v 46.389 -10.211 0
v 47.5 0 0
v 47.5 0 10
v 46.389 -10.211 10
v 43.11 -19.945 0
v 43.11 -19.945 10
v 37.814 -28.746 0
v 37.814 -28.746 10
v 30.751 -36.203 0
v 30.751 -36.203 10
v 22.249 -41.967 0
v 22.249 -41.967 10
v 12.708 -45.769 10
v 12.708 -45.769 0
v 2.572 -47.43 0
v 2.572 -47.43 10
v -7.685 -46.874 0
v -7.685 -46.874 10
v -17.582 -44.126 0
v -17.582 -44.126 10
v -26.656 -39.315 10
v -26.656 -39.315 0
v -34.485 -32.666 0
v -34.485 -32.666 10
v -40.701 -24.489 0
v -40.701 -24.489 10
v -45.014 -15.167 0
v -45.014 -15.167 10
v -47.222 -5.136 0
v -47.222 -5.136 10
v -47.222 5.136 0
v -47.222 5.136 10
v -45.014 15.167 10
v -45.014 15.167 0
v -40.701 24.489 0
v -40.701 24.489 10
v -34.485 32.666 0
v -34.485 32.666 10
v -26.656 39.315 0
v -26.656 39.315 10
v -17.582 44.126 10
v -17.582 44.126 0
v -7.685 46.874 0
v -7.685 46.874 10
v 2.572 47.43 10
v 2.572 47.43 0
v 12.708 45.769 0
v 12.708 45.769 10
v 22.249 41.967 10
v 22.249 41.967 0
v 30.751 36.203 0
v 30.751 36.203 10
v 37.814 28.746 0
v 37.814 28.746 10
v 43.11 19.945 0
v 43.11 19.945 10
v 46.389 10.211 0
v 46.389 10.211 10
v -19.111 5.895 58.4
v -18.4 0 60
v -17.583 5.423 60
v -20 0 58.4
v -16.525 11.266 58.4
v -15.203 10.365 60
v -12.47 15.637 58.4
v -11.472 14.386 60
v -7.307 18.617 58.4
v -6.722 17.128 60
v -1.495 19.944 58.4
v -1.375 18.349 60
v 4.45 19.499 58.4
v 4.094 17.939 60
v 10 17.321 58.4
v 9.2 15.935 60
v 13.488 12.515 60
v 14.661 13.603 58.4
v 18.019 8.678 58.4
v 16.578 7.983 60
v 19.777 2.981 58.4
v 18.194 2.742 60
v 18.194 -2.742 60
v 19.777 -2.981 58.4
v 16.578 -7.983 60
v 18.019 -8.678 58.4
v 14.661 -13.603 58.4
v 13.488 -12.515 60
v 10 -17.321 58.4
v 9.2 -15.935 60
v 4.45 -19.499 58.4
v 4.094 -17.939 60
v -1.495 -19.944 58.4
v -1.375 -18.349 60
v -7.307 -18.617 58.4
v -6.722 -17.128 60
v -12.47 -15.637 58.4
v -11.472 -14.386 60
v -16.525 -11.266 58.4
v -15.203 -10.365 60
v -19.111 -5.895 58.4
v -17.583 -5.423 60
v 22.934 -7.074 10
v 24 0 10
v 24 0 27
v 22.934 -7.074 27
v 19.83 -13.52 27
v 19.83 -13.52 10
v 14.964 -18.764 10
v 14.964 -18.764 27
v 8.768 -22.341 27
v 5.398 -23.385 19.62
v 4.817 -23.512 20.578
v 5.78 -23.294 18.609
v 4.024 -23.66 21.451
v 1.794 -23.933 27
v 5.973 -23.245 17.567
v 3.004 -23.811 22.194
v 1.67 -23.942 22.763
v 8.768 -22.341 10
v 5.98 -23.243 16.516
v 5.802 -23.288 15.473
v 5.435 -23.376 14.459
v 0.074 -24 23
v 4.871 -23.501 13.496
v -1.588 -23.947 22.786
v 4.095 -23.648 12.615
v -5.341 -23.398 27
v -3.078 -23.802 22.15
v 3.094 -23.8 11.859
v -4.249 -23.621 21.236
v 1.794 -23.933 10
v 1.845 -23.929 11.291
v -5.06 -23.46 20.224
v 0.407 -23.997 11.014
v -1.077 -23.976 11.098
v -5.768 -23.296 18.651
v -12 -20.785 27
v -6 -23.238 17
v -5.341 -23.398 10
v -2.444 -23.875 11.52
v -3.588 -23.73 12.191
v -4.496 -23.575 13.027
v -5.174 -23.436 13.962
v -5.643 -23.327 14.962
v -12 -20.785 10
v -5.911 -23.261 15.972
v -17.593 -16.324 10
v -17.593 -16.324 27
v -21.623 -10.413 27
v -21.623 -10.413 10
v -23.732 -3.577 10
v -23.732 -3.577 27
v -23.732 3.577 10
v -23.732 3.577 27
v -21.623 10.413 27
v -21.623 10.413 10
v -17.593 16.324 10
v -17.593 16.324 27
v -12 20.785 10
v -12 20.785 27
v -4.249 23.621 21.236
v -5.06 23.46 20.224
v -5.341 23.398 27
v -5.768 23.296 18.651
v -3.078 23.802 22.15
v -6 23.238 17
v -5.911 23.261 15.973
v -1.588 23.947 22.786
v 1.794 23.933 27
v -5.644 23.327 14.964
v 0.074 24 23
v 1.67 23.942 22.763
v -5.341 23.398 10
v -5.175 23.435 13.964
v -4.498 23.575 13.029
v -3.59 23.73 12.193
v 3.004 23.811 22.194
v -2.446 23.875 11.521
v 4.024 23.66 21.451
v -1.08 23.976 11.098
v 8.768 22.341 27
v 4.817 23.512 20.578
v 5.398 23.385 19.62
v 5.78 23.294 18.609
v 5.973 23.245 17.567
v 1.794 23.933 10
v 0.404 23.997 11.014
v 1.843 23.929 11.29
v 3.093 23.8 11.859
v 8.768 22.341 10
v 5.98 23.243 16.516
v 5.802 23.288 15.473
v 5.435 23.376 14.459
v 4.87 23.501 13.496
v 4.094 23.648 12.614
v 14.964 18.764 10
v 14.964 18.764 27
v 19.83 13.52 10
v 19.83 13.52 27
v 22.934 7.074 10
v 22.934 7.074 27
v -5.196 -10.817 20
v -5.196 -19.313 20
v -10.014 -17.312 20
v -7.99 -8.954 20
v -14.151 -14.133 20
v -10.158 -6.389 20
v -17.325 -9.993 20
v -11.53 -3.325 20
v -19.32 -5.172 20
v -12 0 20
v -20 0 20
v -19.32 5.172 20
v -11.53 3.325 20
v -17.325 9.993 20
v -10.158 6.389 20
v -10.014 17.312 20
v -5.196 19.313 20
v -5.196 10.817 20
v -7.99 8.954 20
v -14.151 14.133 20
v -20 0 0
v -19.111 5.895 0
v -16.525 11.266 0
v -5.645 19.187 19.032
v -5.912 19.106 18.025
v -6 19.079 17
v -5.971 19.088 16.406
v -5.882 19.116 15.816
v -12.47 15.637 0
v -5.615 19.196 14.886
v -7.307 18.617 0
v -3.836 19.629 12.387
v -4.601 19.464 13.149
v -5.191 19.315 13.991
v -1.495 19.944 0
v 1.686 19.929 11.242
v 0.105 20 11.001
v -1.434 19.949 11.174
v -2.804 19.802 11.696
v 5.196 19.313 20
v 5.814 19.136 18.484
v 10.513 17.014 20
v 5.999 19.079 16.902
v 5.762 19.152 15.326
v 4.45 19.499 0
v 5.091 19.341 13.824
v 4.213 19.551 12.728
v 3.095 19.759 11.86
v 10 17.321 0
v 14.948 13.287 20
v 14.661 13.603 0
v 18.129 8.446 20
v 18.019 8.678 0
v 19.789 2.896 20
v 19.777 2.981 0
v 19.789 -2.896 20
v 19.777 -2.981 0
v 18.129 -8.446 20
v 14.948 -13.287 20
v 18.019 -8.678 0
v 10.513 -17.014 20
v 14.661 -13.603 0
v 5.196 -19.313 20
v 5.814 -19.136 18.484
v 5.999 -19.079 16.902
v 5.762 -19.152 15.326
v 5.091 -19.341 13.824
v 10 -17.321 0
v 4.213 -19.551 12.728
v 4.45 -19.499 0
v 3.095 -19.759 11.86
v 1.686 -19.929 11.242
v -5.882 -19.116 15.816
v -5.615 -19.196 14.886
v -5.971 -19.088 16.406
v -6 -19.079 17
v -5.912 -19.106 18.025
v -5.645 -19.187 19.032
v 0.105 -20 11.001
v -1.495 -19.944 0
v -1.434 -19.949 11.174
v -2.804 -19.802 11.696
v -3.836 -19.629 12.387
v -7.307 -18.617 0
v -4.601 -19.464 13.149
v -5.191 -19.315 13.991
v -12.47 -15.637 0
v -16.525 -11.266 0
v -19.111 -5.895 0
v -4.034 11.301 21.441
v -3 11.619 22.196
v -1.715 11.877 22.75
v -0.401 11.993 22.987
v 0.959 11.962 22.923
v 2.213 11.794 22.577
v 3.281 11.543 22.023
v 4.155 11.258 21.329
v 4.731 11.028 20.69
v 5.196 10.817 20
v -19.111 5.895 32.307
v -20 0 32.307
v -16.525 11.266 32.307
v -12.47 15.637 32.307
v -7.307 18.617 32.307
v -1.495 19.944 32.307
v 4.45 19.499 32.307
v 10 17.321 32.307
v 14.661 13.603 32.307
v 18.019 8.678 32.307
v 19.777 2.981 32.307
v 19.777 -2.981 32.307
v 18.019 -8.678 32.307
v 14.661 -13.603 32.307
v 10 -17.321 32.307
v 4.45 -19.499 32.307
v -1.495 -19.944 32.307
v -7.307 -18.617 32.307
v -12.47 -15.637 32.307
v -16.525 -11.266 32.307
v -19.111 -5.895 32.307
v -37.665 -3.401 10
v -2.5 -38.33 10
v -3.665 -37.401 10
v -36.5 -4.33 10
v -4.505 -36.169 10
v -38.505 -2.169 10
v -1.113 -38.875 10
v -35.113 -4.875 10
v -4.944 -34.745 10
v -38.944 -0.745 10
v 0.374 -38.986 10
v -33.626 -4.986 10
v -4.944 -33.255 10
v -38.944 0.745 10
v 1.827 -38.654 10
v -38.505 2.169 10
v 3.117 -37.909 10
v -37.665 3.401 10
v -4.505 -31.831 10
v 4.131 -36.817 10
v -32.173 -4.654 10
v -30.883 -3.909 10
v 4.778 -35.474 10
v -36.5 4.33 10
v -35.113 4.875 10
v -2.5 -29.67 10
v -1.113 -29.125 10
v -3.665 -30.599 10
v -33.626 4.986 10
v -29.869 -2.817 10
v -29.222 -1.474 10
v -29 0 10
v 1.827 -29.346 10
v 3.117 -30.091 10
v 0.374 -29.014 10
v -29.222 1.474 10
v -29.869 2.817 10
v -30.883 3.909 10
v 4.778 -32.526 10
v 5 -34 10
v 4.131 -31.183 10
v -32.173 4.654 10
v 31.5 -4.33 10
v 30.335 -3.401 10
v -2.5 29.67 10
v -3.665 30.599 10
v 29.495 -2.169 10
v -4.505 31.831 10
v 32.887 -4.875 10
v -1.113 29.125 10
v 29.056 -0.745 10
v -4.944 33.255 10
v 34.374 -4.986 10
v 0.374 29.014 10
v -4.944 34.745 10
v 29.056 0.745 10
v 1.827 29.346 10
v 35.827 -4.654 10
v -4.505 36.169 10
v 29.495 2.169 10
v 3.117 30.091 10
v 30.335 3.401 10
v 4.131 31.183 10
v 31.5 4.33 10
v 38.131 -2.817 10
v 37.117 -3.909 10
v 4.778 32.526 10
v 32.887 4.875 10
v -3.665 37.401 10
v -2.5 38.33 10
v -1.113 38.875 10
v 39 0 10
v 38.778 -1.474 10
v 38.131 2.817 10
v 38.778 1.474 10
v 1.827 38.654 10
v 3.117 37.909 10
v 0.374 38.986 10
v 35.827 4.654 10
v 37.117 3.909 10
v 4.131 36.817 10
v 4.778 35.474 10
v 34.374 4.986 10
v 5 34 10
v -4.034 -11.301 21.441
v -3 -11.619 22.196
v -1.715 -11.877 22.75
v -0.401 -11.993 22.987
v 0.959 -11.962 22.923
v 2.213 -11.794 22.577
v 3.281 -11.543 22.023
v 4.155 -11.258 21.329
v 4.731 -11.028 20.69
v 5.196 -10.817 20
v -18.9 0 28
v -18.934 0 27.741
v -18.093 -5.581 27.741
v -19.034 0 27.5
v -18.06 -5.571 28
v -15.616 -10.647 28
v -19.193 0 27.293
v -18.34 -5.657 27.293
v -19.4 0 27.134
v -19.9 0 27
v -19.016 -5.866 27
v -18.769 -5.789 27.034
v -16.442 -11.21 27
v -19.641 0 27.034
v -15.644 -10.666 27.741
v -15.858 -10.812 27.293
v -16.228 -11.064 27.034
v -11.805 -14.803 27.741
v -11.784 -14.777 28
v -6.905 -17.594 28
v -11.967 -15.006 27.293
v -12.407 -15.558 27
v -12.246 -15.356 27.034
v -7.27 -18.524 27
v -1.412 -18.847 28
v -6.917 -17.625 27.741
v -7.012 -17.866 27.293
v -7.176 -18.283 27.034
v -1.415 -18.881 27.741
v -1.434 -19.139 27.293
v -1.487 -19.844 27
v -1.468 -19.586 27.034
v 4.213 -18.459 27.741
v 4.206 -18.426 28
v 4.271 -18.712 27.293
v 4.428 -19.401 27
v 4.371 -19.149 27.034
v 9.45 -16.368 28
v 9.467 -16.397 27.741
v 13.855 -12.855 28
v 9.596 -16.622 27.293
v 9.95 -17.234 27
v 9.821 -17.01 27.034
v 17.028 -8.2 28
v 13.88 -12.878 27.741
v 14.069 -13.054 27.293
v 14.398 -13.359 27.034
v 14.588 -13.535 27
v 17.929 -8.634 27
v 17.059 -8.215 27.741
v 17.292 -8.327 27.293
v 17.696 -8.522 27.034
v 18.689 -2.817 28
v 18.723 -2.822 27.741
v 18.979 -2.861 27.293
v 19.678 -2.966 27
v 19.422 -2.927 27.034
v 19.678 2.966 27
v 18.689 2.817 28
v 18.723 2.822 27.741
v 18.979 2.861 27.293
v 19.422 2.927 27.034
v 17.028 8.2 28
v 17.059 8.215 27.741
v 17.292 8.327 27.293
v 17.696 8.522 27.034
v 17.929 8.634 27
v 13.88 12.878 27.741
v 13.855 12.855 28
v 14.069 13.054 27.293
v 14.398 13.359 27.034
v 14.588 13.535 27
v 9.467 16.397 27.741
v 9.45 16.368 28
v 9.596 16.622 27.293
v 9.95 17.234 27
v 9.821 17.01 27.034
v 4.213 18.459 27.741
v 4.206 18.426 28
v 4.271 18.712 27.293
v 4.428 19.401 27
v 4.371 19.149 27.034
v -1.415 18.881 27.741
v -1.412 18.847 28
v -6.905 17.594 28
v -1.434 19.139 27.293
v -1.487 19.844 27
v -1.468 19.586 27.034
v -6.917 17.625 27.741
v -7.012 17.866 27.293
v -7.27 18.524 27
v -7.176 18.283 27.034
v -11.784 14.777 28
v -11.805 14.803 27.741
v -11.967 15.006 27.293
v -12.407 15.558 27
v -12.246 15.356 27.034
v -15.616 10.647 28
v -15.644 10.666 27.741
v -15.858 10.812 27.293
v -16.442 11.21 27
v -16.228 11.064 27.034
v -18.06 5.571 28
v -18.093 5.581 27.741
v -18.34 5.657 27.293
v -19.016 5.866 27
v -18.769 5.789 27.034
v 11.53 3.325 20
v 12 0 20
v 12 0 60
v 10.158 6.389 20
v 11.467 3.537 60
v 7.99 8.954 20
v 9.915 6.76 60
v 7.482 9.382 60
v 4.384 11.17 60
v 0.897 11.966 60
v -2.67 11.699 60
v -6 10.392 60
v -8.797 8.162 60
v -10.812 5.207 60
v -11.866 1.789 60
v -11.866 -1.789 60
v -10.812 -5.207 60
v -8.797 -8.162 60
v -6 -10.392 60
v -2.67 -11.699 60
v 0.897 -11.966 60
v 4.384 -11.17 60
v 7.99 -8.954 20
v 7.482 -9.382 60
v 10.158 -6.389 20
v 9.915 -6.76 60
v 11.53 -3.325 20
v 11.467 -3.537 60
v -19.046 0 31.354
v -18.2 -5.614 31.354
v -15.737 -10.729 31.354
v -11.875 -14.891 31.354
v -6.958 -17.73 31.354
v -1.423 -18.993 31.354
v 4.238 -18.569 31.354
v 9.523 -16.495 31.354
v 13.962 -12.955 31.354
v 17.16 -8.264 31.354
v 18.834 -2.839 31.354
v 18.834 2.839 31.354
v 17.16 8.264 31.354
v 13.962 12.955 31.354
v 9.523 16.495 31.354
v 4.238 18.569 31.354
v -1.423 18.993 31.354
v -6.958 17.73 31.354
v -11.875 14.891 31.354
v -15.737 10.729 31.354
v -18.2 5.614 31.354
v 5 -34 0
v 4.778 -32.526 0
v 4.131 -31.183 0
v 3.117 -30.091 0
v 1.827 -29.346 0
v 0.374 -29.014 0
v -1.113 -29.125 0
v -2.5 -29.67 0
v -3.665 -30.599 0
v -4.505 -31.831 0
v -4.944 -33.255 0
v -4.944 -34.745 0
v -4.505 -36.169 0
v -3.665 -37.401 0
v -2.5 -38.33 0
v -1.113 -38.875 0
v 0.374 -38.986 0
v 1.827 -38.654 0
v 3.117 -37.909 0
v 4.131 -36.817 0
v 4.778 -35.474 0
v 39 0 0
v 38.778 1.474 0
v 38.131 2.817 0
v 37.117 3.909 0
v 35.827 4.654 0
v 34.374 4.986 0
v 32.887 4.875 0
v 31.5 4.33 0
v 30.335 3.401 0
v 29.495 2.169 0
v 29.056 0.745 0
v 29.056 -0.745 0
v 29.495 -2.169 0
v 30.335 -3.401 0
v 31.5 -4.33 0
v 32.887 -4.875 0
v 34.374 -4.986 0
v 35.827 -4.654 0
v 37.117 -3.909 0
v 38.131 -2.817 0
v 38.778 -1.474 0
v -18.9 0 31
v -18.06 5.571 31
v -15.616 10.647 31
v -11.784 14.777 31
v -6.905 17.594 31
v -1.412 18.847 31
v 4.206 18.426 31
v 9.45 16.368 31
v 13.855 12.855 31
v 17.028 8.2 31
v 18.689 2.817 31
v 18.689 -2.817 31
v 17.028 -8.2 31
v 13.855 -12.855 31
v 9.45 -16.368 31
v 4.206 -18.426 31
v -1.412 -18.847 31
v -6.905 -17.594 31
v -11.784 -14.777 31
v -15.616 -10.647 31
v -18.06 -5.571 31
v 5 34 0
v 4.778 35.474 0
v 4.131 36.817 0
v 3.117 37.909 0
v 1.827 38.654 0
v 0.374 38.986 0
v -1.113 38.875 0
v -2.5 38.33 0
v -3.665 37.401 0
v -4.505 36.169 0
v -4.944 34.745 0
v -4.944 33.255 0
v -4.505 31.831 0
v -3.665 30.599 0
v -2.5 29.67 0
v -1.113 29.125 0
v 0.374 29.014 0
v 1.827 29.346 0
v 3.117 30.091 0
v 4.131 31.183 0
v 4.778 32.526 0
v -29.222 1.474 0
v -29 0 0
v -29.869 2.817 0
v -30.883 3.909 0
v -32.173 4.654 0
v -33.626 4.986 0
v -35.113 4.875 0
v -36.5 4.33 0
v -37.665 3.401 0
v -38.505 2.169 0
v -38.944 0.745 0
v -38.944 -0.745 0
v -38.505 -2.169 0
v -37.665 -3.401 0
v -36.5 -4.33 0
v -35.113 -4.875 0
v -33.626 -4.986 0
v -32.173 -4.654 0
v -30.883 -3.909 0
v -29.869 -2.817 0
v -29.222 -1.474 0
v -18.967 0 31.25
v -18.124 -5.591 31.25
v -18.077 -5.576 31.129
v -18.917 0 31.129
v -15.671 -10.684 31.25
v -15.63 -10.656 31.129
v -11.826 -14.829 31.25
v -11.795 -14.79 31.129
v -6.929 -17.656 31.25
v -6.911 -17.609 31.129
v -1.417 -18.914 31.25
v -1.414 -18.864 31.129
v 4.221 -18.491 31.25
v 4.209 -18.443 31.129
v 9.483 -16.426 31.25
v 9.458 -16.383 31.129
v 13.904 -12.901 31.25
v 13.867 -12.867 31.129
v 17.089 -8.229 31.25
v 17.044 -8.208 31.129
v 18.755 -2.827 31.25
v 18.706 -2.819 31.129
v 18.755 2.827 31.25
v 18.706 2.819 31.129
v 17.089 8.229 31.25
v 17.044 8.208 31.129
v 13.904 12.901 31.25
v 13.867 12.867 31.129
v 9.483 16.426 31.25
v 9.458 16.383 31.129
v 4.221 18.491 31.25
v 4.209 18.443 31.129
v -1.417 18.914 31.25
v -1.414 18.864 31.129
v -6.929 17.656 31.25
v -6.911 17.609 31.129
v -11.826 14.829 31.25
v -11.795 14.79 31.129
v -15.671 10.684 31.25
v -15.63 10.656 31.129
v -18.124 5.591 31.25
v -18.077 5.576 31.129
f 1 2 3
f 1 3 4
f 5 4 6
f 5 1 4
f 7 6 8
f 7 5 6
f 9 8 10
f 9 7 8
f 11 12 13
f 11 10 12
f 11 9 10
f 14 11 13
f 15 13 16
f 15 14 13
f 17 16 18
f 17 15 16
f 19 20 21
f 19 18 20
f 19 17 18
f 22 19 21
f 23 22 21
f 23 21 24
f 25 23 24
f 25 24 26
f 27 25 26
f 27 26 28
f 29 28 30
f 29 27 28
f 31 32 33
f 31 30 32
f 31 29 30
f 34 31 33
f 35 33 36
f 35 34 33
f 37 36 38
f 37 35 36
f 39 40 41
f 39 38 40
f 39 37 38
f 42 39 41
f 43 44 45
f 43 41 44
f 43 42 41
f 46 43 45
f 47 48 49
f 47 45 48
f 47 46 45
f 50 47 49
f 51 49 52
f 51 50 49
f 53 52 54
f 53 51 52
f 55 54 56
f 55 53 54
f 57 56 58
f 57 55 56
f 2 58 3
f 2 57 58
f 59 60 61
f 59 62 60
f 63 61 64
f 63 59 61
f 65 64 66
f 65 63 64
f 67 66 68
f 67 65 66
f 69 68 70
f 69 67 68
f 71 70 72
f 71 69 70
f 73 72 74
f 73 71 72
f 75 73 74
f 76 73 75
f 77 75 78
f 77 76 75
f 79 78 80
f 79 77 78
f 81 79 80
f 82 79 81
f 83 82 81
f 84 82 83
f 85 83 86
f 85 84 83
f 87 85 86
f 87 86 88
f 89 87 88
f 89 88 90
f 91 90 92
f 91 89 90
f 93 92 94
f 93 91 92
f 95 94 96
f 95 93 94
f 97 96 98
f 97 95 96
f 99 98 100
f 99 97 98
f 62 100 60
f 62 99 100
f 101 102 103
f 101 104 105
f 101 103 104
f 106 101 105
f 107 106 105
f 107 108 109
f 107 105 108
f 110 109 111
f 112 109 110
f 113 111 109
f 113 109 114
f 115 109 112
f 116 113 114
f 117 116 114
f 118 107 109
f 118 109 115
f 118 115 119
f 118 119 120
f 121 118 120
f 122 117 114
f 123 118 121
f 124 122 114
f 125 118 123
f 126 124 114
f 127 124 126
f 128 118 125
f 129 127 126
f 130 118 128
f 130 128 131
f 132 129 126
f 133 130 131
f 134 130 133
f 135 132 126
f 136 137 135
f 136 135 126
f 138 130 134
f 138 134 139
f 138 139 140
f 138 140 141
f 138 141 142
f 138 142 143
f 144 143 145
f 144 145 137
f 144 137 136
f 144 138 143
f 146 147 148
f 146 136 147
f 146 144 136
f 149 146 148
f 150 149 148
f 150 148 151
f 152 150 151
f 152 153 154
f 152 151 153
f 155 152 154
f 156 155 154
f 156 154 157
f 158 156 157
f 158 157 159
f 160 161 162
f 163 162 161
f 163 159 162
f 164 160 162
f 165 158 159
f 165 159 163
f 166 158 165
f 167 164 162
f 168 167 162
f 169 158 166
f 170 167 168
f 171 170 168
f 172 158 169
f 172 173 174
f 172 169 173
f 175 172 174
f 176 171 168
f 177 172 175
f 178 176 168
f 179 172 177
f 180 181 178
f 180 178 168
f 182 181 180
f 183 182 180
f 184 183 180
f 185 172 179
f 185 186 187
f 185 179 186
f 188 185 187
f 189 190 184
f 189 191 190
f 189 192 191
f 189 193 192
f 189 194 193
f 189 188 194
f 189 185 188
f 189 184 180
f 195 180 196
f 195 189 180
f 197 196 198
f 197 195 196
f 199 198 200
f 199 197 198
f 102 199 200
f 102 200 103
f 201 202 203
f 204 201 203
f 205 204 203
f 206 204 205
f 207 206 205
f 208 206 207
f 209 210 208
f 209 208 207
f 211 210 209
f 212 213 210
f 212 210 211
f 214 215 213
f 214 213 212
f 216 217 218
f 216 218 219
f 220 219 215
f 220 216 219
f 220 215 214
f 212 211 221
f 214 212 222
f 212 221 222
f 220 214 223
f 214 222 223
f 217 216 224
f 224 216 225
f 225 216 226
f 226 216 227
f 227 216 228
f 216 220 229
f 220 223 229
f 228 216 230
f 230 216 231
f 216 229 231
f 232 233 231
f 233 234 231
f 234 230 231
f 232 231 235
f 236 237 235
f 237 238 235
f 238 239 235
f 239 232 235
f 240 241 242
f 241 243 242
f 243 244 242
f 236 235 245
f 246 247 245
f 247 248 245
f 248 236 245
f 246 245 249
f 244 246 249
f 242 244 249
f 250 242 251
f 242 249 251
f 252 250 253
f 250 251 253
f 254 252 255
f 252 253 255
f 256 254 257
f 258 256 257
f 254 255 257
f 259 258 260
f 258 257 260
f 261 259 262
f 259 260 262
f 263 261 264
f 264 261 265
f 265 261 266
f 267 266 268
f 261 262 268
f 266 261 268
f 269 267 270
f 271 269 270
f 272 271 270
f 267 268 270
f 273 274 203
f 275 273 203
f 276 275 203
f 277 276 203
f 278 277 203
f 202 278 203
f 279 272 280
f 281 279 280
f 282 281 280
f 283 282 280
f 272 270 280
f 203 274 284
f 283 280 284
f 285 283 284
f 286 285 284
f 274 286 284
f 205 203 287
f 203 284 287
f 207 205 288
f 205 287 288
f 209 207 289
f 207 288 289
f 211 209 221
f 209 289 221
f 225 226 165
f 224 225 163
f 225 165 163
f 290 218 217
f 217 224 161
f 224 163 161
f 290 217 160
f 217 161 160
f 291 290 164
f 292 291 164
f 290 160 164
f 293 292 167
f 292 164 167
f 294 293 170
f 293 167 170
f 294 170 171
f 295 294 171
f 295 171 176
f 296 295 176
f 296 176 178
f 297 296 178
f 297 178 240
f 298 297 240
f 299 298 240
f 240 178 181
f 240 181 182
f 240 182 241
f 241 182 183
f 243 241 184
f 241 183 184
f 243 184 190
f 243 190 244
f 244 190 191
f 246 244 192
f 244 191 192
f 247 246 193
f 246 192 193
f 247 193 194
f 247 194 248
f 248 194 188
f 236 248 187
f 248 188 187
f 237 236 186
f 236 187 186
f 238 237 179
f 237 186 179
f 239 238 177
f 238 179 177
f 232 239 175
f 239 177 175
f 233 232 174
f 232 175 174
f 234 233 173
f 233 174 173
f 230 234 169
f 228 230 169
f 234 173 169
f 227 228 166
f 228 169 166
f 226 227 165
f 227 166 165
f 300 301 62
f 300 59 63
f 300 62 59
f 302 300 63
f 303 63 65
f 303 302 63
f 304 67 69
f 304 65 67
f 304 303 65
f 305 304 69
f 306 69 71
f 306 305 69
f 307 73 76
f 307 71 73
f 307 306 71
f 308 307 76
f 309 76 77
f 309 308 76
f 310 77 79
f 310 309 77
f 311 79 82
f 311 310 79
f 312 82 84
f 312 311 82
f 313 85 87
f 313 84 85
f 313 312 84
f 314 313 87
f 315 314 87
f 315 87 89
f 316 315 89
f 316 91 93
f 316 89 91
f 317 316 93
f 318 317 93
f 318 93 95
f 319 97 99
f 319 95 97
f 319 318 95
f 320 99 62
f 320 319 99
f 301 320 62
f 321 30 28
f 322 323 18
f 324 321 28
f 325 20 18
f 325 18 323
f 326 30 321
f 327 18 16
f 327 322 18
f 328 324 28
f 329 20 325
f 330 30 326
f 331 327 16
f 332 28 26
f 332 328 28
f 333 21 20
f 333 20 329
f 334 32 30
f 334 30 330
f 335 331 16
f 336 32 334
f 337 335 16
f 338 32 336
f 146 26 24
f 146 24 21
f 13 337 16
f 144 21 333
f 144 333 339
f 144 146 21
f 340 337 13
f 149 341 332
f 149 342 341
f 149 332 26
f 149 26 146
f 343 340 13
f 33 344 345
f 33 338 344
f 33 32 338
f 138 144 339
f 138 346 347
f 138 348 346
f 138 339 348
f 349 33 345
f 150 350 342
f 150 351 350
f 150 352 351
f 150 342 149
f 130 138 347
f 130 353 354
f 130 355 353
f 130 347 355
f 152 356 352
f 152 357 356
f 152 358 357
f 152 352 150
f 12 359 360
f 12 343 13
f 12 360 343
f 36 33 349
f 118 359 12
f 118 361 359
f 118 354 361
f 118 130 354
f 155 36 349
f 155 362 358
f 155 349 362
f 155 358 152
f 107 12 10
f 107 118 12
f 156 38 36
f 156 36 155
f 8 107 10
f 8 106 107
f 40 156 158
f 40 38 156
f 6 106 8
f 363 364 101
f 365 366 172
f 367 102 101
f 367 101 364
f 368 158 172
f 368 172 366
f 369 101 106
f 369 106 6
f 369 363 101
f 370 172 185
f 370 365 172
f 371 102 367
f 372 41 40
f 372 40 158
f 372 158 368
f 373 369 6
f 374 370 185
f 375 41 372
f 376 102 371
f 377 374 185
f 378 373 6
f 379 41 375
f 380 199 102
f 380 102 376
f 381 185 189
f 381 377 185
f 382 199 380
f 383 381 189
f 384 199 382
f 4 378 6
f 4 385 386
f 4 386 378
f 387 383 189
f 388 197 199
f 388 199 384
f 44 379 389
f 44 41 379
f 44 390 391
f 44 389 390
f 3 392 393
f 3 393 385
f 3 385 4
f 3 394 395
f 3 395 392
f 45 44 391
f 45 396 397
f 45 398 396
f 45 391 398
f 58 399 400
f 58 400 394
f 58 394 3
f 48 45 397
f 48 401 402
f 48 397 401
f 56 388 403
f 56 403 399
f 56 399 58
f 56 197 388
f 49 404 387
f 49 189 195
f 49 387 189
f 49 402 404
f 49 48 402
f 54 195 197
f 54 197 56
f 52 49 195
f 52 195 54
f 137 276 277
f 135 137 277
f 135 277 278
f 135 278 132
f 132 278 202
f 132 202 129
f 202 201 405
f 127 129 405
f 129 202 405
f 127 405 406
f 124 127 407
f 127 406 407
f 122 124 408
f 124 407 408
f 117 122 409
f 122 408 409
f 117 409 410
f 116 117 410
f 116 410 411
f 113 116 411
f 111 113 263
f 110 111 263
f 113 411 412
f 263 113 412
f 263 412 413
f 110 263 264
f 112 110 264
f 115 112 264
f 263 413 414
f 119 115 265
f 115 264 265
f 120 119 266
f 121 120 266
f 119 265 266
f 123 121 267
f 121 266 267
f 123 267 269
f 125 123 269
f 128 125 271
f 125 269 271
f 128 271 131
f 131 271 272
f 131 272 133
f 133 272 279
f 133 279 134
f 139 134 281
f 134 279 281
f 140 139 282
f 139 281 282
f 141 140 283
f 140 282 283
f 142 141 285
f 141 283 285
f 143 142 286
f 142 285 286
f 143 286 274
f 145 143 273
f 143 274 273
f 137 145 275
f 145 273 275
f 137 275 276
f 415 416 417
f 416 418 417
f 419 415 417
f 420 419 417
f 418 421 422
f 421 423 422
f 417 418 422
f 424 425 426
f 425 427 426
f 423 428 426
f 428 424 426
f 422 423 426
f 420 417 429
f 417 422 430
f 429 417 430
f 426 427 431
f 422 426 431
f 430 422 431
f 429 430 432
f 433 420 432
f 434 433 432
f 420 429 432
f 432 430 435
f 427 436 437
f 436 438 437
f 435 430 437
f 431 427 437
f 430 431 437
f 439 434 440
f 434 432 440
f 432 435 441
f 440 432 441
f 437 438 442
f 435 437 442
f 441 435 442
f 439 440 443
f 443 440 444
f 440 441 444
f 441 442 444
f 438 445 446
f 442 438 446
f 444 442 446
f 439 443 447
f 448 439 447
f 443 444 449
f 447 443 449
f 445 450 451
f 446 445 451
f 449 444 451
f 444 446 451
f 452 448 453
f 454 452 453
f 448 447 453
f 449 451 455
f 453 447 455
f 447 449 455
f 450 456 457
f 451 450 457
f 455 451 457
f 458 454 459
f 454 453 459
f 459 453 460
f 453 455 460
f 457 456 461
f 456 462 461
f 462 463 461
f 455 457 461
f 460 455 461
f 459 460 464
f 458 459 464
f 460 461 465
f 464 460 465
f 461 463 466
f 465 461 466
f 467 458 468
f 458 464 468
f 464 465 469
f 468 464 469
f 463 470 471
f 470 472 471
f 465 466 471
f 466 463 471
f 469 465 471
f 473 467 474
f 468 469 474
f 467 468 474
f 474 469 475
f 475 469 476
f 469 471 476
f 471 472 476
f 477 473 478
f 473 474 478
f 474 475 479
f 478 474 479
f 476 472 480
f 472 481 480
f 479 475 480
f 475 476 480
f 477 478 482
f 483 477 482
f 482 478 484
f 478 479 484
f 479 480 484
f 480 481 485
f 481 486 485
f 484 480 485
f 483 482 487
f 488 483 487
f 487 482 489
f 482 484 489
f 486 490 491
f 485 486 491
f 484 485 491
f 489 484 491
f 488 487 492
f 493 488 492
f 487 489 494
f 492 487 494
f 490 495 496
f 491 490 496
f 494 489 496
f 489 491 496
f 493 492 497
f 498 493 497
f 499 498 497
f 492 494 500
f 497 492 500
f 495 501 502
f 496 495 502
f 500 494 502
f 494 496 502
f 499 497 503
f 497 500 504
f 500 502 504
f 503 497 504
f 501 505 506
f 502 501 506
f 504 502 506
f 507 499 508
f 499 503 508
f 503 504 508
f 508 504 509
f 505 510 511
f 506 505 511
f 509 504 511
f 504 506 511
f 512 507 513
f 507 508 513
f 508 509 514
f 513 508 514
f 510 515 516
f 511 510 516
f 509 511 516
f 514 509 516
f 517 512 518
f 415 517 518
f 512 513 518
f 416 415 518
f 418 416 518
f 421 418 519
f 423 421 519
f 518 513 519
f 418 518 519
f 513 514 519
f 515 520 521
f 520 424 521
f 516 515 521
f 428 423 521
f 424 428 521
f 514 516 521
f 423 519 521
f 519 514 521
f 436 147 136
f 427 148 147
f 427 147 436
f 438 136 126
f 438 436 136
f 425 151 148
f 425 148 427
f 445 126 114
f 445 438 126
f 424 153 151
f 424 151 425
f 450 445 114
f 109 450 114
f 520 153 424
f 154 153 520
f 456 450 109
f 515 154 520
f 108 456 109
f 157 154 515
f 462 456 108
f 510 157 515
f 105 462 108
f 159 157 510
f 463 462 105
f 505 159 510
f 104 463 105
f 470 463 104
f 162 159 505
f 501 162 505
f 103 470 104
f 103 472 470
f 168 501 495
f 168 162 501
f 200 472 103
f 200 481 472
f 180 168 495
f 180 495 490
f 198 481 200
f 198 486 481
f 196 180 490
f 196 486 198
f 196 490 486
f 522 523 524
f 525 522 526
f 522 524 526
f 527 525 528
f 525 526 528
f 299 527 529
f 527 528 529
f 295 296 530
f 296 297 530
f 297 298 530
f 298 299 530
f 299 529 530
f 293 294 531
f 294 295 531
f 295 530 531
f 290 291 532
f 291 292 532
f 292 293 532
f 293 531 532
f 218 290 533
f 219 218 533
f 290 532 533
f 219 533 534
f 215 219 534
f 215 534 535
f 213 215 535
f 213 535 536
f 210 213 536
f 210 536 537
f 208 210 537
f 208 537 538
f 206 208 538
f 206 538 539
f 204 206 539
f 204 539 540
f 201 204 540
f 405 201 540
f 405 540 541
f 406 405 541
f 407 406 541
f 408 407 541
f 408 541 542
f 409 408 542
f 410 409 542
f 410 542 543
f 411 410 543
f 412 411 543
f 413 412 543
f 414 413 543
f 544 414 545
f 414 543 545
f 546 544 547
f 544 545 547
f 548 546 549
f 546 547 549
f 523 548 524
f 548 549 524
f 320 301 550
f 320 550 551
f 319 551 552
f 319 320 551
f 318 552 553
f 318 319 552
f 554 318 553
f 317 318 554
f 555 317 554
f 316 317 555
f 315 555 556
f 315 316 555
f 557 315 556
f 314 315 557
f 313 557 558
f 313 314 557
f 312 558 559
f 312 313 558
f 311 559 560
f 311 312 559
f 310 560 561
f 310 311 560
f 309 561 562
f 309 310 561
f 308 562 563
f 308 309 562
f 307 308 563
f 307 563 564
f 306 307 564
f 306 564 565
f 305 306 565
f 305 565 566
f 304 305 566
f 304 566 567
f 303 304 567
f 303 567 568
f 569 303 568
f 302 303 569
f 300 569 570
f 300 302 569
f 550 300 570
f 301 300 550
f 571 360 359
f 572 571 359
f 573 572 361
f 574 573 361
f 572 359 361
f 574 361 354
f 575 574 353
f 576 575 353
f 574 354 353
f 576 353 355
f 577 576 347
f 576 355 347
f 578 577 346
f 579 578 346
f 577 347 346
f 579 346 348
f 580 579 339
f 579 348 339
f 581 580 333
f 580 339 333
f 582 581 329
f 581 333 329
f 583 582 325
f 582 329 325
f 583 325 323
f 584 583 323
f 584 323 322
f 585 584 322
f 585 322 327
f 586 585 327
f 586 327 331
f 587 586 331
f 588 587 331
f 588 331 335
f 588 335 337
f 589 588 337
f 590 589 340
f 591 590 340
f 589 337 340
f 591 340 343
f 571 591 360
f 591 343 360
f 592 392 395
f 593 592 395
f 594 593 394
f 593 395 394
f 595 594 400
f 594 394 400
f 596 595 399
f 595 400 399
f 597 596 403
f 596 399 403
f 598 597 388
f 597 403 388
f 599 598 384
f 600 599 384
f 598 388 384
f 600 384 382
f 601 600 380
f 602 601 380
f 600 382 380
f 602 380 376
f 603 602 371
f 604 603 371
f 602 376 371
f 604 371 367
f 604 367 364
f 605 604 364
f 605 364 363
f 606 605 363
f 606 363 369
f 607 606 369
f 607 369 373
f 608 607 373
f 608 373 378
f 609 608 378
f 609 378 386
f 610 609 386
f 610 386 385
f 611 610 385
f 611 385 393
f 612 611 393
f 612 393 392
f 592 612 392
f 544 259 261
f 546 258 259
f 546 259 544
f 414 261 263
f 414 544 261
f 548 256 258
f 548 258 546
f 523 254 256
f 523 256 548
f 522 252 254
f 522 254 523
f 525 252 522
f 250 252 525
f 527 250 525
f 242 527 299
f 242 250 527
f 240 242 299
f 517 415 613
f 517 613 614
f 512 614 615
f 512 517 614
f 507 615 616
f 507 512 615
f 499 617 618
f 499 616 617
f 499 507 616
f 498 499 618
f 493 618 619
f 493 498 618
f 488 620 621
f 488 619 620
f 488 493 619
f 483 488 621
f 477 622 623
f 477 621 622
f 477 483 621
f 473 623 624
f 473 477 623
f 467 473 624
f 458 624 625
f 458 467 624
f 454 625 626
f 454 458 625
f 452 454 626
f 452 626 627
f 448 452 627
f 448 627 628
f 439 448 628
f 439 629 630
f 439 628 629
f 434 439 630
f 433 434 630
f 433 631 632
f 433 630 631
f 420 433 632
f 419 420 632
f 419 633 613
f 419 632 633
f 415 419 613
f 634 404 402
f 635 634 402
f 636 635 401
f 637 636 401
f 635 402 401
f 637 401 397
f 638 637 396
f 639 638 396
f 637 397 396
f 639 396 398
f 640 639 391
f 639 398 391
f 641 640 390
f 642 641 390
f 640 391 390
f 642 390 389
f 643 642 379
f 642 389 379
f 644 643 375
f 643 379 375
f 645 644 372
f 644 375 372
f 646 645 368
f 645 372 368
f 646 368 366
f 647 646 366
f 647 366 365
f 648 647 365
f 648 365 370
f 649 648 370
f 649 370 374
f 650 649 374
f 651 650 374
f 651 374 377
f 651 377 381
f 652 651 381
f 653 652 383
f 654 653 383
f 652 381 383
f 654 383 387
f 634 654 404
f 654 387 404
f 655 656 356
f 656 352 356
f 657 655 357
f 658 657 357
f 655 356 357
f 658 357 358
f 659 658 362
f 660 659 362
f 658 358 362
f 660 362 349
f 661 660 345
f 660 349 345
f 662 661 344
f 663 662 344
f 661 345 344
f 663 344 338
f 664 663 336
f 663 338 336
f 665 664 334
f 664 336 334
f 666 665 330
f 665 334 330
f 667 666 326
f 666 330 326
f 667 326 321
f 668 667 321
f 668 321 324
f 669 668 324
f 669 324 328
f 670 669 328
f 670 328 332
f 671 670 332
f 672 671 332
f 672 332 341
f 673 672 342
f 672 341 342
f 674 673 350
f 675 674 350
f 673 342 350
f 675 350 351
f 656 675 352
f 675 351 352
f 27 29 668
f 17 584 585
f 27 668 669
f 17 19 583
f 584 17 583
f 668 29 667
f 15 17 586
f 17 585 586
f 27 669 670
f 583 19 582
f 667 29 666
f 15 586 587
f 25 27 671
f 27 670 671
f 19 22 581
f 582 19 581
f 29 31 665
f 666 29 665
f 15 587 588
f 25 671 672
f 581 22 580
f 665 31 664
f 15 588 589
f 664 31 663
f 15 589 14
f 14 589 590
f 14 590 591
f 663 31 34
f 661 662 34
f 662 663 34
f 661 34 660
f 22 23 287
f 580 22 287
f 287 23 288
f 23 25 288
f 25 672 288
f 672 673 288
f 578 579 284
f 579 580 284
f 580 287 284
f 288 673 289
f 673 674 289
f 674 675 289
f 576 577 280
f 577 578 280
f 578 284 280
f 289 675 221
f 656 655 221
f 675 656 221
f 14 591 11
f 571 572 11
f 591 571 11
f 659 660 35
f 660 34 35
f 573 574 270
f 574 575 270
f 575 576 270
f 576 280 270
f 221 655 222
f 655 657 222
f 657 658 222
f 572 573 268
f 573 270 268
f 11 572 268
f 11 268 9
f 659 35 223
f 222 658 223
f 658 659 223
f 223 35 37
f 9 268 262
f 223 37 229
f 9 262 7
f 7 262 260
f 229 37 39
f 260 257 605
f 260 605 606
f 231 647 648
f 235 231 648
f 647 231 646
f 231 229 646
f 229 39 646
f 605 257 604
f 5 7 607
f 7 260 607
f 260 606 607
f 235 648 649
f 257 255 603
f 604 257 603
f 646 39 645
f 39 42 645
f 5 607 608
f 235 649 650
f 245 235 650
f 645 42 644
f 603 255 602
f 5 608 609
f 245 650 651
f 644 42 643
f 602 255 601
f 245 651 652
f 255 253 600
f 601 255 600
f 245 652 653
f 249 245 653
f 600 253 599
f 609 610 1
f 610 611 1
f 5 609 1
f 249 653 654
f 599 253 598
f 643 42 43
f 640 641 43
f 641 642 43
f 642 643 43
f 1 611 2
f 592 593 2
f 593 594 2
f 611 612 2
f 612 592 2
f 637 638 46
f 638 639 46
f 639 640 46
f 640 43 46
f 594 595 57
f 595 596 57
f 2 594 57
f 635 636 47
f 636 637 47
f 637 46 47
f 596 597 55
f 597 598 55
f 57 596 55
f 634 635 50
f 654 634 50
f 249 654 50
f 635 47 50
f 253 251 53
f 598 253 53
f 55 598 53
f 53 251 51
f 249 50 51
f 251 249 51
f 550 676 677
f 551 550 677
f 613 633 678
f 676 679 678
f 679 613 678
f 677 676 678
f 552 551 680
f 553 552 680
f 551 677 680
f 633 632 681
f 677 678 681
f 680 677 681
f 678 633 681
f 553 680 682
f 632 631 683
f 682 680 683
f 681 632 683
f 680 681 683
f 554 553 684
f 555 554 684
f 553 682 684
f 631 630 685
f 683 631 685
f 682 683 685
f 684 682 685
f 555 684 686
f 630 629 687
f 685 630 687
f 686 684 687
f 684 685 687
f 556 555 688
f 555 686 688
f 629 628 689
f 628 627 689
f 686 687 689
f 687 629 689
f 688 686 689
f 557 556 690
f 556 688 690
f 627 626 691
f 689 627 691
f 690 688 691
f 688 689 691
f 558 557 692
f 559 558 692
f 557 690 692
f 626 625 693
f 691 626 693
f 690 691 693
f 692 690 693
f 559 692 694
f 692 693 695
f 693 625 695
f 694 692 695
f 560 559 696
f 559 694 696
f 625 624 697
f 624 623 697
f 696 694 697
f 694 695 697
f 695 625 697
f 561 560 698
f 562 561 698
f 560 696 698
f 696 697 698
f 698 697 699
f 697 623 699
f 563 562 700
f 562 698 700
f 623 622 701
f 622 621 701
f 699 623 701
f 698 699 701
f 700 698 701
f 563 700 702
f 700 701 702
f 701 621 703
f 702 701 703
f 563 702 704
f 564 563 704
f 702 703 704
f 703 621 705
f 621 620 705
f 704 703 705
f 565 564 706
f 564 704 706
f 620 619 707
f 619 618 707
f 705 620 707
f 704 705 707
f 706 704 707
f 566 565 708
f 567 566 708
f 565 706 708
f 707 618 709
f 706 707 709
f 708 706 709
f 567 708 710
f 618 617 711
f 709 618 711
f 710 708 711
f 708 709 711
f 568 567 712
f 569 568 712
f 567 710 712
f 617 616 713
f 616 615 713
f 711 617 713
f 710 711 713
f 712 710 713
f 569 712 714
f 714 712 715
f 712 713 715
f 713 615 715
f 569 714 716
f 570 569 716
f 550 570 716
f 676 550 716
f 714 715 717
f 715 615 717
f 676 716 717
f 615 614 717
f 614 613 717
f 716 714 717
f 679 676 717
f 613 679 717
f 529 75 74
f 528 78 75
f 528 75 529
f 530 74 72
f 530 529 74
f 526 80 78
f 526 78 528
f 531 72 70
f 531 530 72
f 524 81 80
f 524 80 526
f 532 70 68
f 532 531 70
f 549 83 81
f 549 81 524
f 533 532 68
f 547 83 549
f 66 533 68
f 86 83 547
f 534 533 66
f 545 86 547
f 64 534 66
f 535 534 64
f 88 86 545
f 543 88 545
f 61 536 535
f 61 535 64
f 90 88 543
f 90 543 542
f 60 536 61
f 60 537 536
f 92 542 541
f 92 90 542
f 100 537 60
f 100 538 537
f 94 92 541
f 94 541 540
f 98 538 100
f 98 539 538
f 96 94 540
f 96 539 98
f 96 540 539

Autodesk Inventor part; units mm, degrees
ref_plane "YZ Plane" through (0, 0, 0) normal (1, 0, 0) x (0, 1, 0)
ref_plane "XZ Plane" through (0, 0, 0) normal (0, 1, 0) x (-1, 0, 0)
ref_plane "XY Plane" through (0, 0, 0) normal (0, 0, 1) x (1, 0, 0)
sketch "Эскиз1" plane through (0, 0, 0) normal (0, 0, 1) x (1, 0, 0)
  circle A0 centre (0, 0) radius 47.5
  dimension "d0" = 95
extrude "Выдавливание1" add sketch "Эскиз1" along normal blind 10
sketch "Эскиз2" plane through (0, 0, 10) normal (0, 0, 1) x (1, 0, 0)
  circle A0 centre (0, 0) radius 24
  dimension "d3" = 48
extrude "Выдавливание2" add sketch "Эскиз2" along normal blind 17
sketch "Эскиз4" plane through (0, 0, 10) normal (0, 0, 1) x (1, 0, 0)
  line L0 (0, 0) -> (34, 0)
  circle A0 centre (34, 0) radius 5
  circle A1 centre (0, 34) radius 5
  circle A2 centre (-34, 0) radius 5
  circle A3 centre (0, -34) radius 5
  dimension "d9" = 34
  dimension "d10" = 10
  dimension "d13" = 360
extrude "Выдавливание4" cut sketch "Эскиз4" against normal through all
sketch "Эскиз5" plane through (0, 0, 0) normal (0, 1, 0) x (-1, 0, 0)
  line L0 (0, 27) -> (0, 60)
  line L1 (0, 60) -> (20, 60)
  line L2 (20, 60) -> (20, 32.3071)
  line L3 (20, 32.3071) -> (19.0464, 31.3536)
  line L4 (18.9, 31) -> (18.9, 28)
  arc A0 (18.9, 28) -> (19.9, 27) centre (19.9, 28) ccw
  arc A1 (19.0464, 31.3536) -> (18.9, 31) centre (19.4, 31) ccw
  line L5 (0, 27) -> (19.9, 27)
  line L6 (24, 27) -> (-24, 27) projected
  line L7 (0, -12) -> (0, 72) projected
  point P0 (0, 0)
  dimension "d17" = 33
  dimension "d18" = 20
  dimension "d19" = 18.9
  dimension "d20" = 1
  dimension "d21" = 45
  dimension "d22" = 0.5
revolve "Вращение1" add sketch "Эскиз5" angle 360 about axis through (0, 0, -10) along (0, 0, 1)
chamfer "Фаска1" distance 1.6 angle 45 1 edges at (20, 0, 60)
thread "Резьба1" size "M40x1.5" class "6g" standard "ANSI Metric M Profile" full length
sketch "Эскиз6" plane through (0, 0, 60) normal (0, 0, 1) x (1, 0, 0)
  circle A0 centre (0, 0) radius 12
  dimension "d30" = 24
sketch "Эскиз7" plane through (0, 0, 0) normal (0, 0, -1) x (-1, 0, 0)
  circle A0 centre (0, 0) radius 20
  dimension "d31" = 40
extrude "Выдавливание5" cut sketch "Эскиз7" against normal blind 20
extrude "Выдавливание6" cut sketch "Эскиз6" against normal through all
sketch "Эскиз8" plane through (0, 0, 0) normal (0, 1, 0) x (-1, 0, 0)
  circle A0 centre (0, 17) radius 6
  line L0 (0, -16.4988) -> (0, 98.9927) projected
  line L1 (47.5, 10) -> (-47.5, 10) projected
  point P0 (0, 0)
  dimension "d36" = 12
  dimension "d37" = 7
extrude "Выдавливание7" cut sketch "Эскиз8" along normal through all both and the other way through all
properties part number "РК3"
